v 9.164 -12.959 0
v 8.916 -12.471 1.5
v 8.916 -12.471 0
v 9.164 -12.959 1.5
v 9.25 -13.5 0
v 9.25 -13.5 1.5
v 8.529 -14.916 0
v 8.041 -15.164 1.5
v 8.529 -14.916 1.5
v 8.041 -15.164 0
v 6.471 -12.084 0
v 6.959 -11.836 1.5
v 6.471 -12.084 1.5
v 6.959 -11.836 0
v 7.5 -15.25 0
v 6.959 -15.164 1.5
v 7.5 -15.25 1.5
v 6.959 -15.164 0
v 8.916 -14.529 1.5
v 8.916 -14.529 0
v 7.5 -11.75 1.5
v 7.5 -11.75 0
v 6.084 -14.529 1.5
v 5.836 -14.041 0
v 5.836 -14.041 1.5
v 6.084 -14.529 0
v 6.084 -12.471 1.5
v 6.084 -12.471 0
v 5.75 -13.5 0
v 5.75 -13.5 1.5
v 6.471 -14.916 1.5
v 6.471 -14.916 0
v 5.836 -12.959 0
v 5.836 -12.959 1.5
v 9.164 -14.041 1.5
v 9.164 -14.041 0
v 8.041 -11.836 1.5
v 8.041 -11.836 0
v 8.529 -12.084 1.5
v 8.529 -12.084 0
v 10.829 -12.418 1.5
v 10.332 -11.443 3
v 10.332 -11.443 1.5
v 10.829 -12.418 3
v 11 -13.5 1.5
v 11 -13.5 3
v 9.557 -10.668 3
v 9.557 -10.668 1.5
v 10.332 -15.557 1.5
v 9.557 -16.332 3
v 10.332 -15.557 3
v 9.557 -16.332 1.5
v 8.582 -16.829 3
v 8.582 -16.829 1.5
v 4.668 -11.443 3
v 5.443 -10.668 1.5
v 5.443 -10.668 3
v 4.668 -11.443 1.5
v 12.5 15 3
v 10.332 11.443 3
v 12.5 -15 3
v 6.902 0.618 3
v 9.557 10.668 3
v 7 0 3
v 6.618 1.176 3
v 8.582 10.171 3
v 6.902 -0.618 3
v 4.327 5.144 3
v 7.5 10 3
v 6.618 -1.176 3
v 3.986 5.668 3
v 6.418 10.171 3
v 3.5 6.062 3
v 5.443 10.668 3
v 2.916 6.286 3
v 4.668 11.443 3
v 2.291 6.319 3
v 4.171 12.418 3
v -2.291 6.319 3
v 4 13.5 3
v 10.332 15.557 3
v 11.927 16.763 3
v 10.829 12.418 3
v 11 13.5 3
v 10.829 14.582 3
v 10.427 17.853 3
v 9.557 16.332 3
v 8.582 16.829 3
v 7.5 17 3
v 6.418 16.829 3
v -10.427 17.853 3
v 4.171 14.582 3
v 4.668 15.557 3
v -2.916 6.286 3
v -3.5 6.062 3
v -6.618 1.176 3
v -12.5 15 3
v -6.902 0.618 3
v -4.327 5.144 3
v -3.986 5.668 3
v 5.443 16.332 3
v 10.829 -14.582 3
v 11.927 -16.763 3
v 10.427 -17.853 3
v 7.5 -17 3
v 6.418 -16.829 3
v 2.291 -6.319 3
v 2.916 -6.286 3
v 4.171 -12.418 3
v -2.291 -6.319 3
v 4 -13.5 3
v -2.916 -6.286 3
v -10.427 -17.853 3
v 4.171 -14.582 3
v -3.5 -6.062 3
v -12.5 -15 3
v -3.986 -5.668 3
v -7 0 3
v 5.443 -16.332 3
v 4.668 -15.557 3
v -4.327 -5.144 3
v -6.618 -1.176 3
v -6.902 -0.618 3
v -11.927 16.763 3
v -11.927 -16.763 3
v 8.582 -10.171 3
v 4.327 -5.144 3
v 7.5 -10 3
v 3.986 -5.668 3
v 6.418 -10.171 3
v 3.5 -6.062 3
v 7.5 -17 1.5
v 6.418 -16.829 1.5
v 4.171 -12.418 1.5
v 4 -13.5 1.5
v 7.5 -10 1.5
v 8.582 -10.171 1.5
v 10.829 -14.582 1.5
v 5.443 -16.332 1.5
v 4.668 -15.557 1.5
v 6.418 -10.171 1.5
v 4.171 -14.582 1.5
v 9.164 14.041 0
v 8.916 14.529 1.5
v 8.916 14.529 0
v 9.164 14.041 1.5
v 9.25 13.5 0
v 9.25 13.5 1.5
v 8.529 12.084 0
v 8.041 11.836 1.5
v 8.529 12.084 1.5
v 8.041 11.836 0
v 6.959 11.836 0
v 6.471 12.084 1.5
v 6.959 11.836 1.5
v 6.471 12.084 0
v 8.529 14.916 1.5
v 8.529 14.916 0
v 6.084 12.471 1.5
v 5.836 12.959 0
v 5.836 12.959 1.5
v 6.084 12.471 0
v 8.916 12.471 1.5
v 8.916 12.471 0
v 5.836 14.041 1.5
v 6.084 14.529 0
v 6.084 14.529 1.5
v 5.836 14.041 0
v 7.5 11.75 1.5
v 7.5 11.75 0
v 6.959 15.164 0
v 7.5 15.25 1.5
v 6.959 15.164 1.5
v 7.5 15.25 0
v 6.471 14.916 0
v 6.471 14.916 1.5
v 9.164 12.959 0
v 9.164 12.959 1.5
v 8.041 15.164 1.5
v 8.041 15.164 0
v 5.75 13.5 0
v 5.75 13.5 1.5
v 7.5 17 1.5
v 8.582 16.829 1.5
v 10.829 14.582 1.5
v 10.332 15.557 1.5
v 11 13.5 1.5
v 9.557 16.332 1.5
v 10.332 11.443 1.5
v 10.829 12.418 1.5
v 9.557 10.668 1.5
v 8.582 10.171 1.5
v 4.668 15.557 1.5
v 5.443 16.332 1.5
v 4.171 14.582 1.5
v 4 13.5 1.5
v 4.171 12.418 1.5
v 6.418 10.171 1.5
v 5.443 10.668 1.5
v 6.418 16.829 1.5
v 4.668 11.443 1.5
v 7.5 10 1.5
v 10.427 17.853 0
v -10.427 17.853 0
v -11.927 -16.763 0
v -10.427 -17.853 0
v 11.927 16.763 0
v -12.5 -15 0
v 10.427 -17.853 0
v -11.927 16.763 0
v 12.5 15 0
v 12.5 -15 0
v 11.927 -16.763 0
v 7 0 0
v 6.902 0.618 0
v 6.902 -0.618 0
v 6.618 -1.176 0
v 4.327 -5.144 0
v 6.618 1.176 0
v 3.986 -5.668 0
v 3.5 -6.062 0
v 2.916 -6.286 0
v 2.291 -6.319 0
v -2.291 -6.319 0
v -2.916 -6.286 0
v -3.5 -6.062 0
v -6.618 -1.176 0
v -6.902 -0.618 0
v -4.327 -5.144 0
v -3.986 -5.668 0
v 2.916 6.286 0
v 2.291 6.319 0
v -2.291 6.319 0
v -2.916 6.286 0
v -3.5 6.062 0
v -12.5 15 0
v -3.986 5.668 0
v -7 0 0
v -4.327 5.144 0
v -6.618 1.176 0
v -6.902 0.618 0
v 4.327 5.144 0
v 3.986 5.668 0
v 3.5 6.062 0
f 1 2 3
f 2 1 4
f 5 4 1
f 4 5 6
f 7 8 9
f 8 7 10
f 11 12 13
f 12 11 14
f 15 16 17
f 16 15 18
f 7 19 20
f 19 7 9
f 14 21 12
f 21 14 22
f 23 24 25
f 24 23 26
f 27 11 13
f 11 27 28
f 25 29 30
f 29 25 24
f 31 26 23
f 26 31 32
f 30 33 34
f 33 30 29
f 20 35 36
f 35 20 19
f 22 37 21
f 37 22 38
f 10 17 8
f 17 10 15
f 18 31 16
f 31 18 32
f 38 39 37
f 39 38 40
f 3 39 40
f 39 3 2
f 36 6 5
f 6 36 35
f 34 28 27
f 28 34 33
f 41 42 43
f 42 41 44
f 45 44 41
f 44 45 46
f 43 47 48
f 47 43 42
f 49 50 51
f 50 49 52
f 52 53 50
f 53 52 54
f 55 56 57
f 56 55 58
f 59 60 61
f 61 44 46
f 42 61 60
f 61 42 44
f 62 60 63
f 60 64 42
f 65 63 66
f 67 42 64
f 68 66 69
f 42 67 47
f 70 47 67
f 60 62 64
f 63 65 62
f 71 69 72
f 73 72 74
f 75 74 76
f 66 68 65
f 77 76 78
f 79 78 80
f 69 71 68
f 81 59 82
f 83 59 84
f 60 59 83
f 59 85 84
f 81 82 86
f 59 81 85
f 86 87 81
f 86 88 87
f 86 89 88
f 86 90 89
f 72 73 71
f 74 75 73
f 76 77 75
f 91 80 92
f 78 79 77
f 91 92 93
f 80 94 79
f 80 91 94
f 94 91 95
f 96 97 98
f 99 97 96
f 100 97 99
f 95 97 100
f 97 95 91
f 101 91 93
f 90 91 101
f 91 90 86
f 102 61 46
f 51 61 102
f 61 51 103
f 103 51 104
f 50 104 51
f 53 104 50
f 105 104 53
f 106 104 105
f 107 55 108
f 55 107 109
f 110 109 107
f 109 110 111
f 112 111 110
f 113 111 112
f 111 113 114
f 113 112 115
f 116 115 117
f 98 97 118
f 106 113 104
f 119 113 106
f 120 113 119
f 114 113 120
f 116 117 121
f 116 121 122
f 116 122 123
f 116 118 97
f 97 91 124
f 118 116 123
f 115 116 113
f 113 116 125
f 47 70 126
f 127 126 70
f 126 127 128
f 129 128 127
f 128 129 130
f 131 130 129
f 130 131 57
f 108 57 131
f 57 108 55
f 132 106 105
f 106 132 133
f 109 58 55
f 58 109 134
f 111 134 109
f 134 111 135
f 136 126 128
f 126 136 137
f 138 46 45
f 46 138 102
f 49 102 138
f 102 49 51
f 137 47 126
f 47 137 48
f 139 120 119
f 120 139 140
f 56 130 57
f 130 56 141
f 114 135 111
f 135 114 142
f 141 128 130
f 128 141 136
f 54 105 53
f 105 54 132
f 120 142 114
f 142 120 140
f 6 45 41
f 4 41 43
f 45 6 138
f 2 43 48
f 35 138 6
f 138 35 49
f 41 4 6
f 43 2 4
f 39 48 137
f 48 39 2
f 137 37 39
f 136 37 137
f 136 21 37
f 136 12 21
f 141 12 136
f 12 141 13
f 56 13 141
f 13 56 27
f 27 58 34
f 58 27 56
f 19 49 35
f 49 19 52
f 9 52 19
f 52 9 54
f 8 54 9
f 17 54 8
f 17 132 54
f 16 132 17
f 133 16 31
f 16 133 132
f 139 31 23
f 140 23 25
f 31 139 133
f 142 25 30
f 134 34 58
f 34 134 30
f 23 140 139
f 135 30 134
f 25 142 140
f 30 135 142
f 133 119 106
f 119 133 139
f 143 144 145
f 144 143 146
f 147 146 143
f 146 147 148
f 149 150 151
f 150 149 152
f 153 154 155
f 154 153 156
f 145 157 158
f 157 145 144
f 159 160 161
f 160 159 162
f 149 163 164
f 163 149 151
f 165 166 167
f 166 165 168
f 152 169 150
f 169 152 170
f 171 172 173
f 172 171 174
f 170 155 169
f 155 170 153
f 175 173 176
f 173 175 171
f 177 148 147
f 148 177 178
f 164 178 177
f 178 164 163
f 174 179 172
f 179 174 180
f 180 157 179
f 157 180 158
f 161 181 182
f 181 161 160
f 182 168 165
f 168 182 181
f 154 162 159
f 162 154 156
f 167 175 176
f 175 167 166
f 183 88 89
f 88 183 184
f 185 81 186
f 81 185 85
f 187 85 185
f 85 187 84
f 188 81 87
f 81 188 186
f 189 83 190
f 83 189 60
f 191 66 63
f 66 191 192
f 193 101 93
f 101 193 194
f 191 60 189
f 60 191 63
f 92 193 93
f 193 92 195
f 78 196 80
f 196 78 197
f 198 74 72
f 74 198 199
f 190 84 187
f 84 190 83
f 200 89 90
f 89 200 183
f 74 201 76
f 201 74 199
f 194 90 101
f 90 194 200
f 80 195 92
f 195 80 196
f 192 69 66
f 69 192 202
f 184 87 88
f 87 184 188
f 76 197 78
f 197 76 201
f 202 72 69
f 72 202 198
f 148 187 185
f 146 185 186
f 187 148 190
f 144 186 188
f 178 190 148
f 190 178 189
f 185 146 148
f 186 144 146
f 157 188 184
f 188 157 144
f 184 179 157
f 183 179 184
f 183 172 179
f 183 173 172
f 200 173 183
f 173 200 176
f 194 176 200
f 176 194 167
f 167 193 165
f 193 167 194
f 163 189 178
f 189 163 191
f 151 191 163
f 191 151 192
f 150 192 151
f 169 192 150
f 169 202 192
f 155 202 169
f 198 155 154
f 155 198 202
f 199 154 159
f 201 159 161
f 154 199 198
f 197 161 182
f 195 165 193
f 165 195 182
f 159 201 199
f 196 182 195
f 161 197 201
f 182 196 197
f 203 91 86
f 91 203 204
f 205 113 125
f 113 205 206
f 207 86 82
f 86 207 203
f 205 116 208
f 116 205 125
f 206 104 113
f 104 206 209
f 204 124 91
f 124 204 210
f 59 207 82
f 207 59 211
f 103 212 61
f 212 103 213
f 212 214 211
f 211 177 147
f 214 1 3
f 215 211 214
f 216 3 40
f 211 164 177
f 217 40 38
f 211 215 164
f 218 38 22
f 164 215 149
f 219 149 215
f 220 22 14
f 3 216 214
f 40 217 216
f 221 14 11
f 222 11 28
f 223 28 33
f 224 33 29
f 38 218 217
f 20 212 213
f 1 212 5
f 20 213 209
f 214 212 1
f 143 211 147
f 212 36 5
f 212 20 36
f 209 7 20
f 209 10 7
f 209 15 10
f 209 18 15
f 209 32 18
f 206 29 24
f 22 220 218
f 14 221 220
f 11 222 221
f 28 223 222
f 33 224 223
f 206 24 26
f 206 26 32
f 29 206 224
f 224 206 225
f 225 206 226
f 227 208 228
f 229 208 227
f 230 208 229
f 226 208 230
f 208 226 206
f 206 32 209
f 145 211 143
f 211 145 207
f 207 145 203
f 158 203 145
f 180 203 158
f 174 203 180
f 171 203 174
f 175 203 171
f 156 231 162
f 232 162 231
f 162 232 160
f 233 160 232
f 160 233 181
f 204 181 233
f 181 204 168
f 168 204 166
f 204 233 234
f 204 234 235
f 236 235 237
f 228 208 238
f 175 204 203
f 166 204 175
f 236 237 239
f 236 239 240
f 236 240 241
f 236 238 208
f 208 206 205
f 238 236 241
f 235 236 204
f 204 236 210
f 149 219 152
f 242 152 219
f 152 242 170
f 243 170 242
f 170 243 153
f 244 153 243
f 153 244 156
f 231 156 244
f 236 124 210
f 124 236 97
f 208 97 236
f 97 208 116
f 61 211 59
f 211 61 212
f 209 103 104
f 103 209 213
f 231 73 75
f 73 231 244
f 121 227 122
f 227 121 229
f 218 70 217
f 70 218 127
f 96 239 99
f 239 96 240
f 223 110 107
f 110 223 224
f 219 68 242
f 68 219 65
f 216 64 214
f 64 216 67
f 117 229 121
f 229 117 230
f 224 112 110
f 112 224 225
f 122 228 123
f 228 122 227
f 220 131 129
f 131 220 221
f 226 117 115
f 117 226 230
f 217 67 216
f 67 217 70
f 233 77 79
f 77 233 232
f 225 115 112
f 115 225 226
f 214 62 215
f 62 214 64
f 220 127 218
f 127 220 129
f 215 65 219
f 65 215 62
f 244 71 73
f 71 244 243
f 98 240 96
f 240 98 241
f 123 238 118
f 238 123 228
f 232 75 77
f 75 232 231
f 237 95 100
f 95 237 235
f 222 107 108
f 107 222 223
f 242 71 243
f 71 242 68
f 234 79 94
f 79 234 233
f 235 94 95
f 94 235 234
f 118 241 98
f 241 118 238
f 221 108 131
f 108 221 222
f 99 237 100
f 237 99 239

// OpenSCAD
// file: honeycomb_lattice.scad
/**
 * Honeycomb lattice library
 *
 * @autor: vpoten
 */
 
/**
 *
 */
module hexagon(rad, cornerR, thick) {
hull(){
	for(i=[0:5]){
	rotate([0,0,60*i]) translate([rad,0,0]) cylinder(r=cornerR, h=thick, $fn=20);
	}
}
}//end module hexagon

/**
 * @param rows:  number of rowns, must be greater than 0
 * @param cols:  number of colummns, must be greater than 1
 */
module honeycombLattice(rows, cols, hexaR, cornerR, thick, innerDst, fillHalves=false) {

extHexR = sqrt(2*cornerR*cornerR) + hexaR + innerDst/2;
extHexSideL = sin(30)*extHexR*2;
extHexH = cos(30)*extHexR;
dist = 2*extHexR + extHexSideL;
hexH = sqrt(2*cornerR*cornerR) + hexaR;

numEvenCols = floor(cols/2)+(cols%2);
numOddCols = floor(cols/2);

translate([extHexR,extHexH,0]) {
for(i=[0:rows-1]){
	if((i%2)==1){
		for(j=[0:numOddCols-1]) translate([dist*j+(extHexR+extHexSideL/2),i*extHexH,0]) hexagon(hexaR, cornerR, thick);
	}
	else{
		for(j=[0:numEvenCols-1]) translate([dist*j,i*extHexH,0]) hexagon(hexaR, cornerR, thick);
	}
}

if( fillHalves==true ){

	for(i=[-1,rows]){ 
		for(j=[0:numOddCols-1]) translate([dist*j+(extHexR+extHexSideL/2),i*extHexH,0]){
			difference(){
			hexagon(hexaR, cornerR, thick);
			if(i==-1){ translate([0,-extHexR/2+innerDst/2,0]) cube(size=[extHexR*2,extHexR,thick*2.5],center=true); }
			else{ translate([0,extHexR/2-innerDst/2,0]) cube(size=[extHexR*2,extHexR,thick*2.5],center=true); }
			}
		}
	}
}

}//translate

}//end module honeycombLattice

//test
hexagon(20, 2, 29);
honeycombLattice(2, 4, 15, 3, 3, 11, fillHalves=false);
color("grey") translate([0,0,40]) honeycombLattice(5, 6, 11, 2, 3, 19, fillHalves=true);
color("blue") translate([0,0,60]) honeycombLattice(3, 5, 5, 2, bottomThick+1, 3, fillHalves=true);
// file: dronePlates.scad
/**
 * dronePlates.scad
 * Plate library
 *
 * GNU GPL V3
 * @author: Victor Potenciano
 */

m3Rad = 3.4/2;
cornerR = 4;

/**
 *
 */
module helperDisk(diameter) {
	cylinder(r = diameter/2, h = 0.6, $fn=20);
}

/**
 *
 */
module roundedRect(size, radius) {
	x = size[0];
	y = size[1];
	z = size[2];

	linear_extrude(height=z)
	hull() {
	// place 4 circles in the corners, with the given radius
	translate([(-x/2)+(radius/2), (-y/2)+(radius/2), 0]){ circle(r=radius); }
	translate([(x/2)-(radius/2), (-y/2)+(radius/2), 0]){ circle(r=radius); }
	translate([(-x/2)+(radius/2), (y/2)-(radius/2), 0]){ circle(r=radius); }
	translate([(x/2)-(radius/2), (y/2)-(radius/2), 0]){ circle(r=radius); }
	}
}

/**
 * rounded rectangle triangle with corner at origin
 */
module roundedTriangle(size, radius) {
	x = size[0];
	y = size[1];
	z = size[2];

	linear_extrude(height=z)
	hull() {
	translate([radius, radius, 0]){ circle(r=radius); }
	translate([x-radius, radius, 0]){ circle(r=radius); }
	translate([radius, y-radius, 0]){ circle(r=radius); }
	}
}

/**
 *
 */
module roundRectPlate(w, l, plateThick=3) {
	difference(){
		roundedRect([l+m3Rad*1.75,w+m3Rad*1.75,plateThick], cornerR);
		translate([l/2, w/2, -0.5]) { cylinder(h = plateThick+1, r = m3Rad, $fn=30); }
		translate([-l/2, w/2, -0.5]) { cylinder(h = plateThick+1, r = m3Rad, $fn=30); }
		translate([l/2, -w/2, -0.5]) { cylinder(h = plateThick+1, r = m3Rad, $fn=30); }
		translate([-l/2, -w/2, -0.5]) { cylinder(h = plateThick+1, r = m3Rad, $fn=30); }
	}
}

/**
 *
 */
module crossSquarePlate(l, thick=3) {
	inDist = cornerR*2+4;
	trianL = sqrt((l*l)/2)-inDist;
	centerR = 4;

	difference(){
		roundRectPlate(l, l, thick);
		translate([0, centerR, -0.5]) { 
			rotate([0,0,45]){ roundedTriangle([trianL,trianL,thick+1], cornerR-2); }
		}
		translate([0, -centerR, -0.5]) { 
			rotate([0,0,225]){ roundedTriangle([trianL,trianL,thick+1], cornerR-2); }
		}
		translate([-centerR, 0, -0.5]) { 
			rotate([0,0,135]){ roundedTriangle([trianL,trianL,thick+1], cornerR-2); }
		}
		translate([centerR, 0, -0.5]) { 
			rotate([0,0,-45]){ roundedTriangle([trianL,trianL,thick+1], cornerR-2); }
		}
	}
}

/**
 *
 */
module hShapePlate(w, l, thick=4) {
	inDist = cornerR*2+1;

	difference(){
		roundRectPlate(w, l, thick);
		translate([0, w/4, -0.5]) { roundedRect([l-inDist,w/2-inDist,thick+1], cornerR-2); }
		translate([0, -w/4, -0.5]) { roundedRect([l-inDist,w/2-inDist,thick+1], cornerR-2); }
	}
}

/**
 *
 */
module motorCircleMount(inDia, outDia, thick=3, extraH=false, d1=19, d2=16, holeR=m3Rad ) {
	difference(){
		cylinder(h = thick, r = outDia/2, $fn=30);
		motorCircleMountHoles(inDia, outDia, thick, extraH, d1=d1, d2=d2, holeR=holeR);
	}
}

/**
 *
 */
module motorCircleMountHoles(inDia, outDia, thick=3, extraH=false, d1=19, d2=16, d3=25, holeR=m3Rad) {
	translate([0, 0, -0.5]) { cylinder(h = thick+1, r = inDia/2, $fn=30); }

	for(i=[0:3]) {
		rotate([0,0,90*i]){
		translate([d1/2, 0, -0.5]) cylinder(h = thick+1, r = holeR, $fn=20);
		translate([d2/2, 0, -0.5]) cylinder(h = thick+1, r = holeR, $fn=20);
		translate([d2/2, -holeR, -0.5]) cube(size = [(d1-d2)/2,holeR*2,thick+1]);
		}
	}
	
	if(extraH==true){	
		for(i=[-1,1]) translate([i*d3/2, 0, -0.5]) { cylinder(h = thick+1, r = holeR, $fn=30); }
	}
}

/**
 *
 */
module motorRectMount(w, l, inDia, thick=3) {
	d1=19;
	d2=16;

	difference(){
		roundRectPlate(w, l, thick);
		translate([0, 0, -0.5]) { cylinder(h = thick+1, r = inDia/2, $fn=30); }
		translate([0, d1/2, -0.5]) { cylinder(h = thick+1, r = m3Rad, $fn=30); }
		translate([0, -d1/2, -0.5]) { cylinder(h = thick+1, r = m3Rad, $fn=30); }
		translate([d2/2, 0, -0.5]) { cylinder(h = thick+1, r = m3Rad, $fn=30); }
		translate([-d2/2, 0, -0.5]) { cylinder(h = thick+1, r = m3Rad, $fn=30); }
	}
}

/**
 *
 */
module tube(inDia, outDia, height) {
	difference(){
		cylinder(h = height, r = outDia/2, $fn=50);
		translate([0, 0, -0.5]) { cylinder(h = height+1, r = inDia/2, $fn=30); }
	}
}

/**
 *
 */
module squareTube(inDia, outDia, height) {
	translate([0,0,height/2]){
	difference(){
		cube(size = [outDia,outDia,height], center = true);
		cube(size = [inDia,inDia,height+1], center = true);
	}
	}
}

/**
 *
 */
module djiFlamewheelHoles(height) {
	a = 23;
	b = 16;
	c = 19.5;
	
	translate([a/2, c/2, 0]) { cylinder(h = height, r = m3Rad, $fn=30); }
	translate([-a/2, c/2, 0]) { cylinder(h = height, r = m3Rad, $fn=30); }
	translate([b/2, -c/2, 0]) { cylinder(h = height, r = m3Rad, $fn=30); }
	translate([-b/2, -c/2, 0]) { cylinder(h = height, r = m3Rad, $fn=30); }
}

/**
 *
 */
module djiFlamewheelHolesBotton(height) {
	a1 = 21;
	c = 19.5;
	
	translate([a1/2, c/2, 0]) { cylinder(h = height, r = m3Rad, $fn=30); }
	translate([-a1/2, c/2, 0]) { cylinder(h = height, r = m3Rad, $fn=30); }
}

/**
 *
 */
module propeller(size){
union(){
difference(){
	cylinder(h = 3, r = size/2, center=true, $fn=30);
	cylinder(h = 3.1, r = size/2-2, center=true, $fn=30); 
}
for( i = [-1,1] ){
rotate([0,0,45*i]){ cube(size = [size,4,1], center = true); }
}
}
}

/**
 *
 */
module slot(length, height, rad){
for(i=[-1,1]) translate([i*length/2,0,0]) cylinder(h = height, r = rad, $fn=30);
translate([0,0,height/2]) cube(size = [length,rad*2,height], center = true);
}

 

////////////////////////
// Examples:
////////////////////////

motorCircleMount(8, 25, 3.5);

//roundedRect([50,50,3], 4);

//hShapePlate(79, 25);

//rotate([0,0,45]){roundedTriangle([40,40,3], 4);}

//crossSquarePlate(45, 4);

/*
union(){
motorRectMount(21, 18, 8, 4);
translate([9, 10.5, 0]) {tube(m3Rad*2, 6.5, 6);}
}
*/

/*
difference(){
union(){
hShapePlate(50, 30, 3.5);
translate([-4,-25,0]){cube(size = [8,50,3.5]);}
rotate([0, 0, 45]) {motorCircleMount(8, 35, 3.5);}
}
cylinder(h = 10, r = 4, $fn=100, center=true);
}
*/

//rotate([90,0,0]){ tube(5,10,20); }
//translate([20,0,0]){ squareTube(5, 10, 20); }
// main file
/**
 * tweaker front/bottom protector
 */
 
use <dronePlates.scad>;
use <honeycomb_lattice.scad>;

m3Rad = 3.5/2;
thick = 3;


//translate([20,0,0]) cube(size=[2,36,2], center=true);
//translate([-2,20,0]) cube(size=[20,2,2], center=true);

difference(){
roundedRect([22,33,thick], 3);

for(i=[-1,1]){
translate([7.5,i*27/2,-0.5]) cylinder(r=m3Rad, h=thick+1, $fn=20);
translate([7.5,i*27/2,thick/2]) cylinder(r=m3Rad*2, h=thick/2, $fn=20);
///translate([-3,i*8,-0.5]) hexagon(4.5,2,thick+1);
}

translate([0,0,-0.5]) hexagon(5,2,thick+1);
}
